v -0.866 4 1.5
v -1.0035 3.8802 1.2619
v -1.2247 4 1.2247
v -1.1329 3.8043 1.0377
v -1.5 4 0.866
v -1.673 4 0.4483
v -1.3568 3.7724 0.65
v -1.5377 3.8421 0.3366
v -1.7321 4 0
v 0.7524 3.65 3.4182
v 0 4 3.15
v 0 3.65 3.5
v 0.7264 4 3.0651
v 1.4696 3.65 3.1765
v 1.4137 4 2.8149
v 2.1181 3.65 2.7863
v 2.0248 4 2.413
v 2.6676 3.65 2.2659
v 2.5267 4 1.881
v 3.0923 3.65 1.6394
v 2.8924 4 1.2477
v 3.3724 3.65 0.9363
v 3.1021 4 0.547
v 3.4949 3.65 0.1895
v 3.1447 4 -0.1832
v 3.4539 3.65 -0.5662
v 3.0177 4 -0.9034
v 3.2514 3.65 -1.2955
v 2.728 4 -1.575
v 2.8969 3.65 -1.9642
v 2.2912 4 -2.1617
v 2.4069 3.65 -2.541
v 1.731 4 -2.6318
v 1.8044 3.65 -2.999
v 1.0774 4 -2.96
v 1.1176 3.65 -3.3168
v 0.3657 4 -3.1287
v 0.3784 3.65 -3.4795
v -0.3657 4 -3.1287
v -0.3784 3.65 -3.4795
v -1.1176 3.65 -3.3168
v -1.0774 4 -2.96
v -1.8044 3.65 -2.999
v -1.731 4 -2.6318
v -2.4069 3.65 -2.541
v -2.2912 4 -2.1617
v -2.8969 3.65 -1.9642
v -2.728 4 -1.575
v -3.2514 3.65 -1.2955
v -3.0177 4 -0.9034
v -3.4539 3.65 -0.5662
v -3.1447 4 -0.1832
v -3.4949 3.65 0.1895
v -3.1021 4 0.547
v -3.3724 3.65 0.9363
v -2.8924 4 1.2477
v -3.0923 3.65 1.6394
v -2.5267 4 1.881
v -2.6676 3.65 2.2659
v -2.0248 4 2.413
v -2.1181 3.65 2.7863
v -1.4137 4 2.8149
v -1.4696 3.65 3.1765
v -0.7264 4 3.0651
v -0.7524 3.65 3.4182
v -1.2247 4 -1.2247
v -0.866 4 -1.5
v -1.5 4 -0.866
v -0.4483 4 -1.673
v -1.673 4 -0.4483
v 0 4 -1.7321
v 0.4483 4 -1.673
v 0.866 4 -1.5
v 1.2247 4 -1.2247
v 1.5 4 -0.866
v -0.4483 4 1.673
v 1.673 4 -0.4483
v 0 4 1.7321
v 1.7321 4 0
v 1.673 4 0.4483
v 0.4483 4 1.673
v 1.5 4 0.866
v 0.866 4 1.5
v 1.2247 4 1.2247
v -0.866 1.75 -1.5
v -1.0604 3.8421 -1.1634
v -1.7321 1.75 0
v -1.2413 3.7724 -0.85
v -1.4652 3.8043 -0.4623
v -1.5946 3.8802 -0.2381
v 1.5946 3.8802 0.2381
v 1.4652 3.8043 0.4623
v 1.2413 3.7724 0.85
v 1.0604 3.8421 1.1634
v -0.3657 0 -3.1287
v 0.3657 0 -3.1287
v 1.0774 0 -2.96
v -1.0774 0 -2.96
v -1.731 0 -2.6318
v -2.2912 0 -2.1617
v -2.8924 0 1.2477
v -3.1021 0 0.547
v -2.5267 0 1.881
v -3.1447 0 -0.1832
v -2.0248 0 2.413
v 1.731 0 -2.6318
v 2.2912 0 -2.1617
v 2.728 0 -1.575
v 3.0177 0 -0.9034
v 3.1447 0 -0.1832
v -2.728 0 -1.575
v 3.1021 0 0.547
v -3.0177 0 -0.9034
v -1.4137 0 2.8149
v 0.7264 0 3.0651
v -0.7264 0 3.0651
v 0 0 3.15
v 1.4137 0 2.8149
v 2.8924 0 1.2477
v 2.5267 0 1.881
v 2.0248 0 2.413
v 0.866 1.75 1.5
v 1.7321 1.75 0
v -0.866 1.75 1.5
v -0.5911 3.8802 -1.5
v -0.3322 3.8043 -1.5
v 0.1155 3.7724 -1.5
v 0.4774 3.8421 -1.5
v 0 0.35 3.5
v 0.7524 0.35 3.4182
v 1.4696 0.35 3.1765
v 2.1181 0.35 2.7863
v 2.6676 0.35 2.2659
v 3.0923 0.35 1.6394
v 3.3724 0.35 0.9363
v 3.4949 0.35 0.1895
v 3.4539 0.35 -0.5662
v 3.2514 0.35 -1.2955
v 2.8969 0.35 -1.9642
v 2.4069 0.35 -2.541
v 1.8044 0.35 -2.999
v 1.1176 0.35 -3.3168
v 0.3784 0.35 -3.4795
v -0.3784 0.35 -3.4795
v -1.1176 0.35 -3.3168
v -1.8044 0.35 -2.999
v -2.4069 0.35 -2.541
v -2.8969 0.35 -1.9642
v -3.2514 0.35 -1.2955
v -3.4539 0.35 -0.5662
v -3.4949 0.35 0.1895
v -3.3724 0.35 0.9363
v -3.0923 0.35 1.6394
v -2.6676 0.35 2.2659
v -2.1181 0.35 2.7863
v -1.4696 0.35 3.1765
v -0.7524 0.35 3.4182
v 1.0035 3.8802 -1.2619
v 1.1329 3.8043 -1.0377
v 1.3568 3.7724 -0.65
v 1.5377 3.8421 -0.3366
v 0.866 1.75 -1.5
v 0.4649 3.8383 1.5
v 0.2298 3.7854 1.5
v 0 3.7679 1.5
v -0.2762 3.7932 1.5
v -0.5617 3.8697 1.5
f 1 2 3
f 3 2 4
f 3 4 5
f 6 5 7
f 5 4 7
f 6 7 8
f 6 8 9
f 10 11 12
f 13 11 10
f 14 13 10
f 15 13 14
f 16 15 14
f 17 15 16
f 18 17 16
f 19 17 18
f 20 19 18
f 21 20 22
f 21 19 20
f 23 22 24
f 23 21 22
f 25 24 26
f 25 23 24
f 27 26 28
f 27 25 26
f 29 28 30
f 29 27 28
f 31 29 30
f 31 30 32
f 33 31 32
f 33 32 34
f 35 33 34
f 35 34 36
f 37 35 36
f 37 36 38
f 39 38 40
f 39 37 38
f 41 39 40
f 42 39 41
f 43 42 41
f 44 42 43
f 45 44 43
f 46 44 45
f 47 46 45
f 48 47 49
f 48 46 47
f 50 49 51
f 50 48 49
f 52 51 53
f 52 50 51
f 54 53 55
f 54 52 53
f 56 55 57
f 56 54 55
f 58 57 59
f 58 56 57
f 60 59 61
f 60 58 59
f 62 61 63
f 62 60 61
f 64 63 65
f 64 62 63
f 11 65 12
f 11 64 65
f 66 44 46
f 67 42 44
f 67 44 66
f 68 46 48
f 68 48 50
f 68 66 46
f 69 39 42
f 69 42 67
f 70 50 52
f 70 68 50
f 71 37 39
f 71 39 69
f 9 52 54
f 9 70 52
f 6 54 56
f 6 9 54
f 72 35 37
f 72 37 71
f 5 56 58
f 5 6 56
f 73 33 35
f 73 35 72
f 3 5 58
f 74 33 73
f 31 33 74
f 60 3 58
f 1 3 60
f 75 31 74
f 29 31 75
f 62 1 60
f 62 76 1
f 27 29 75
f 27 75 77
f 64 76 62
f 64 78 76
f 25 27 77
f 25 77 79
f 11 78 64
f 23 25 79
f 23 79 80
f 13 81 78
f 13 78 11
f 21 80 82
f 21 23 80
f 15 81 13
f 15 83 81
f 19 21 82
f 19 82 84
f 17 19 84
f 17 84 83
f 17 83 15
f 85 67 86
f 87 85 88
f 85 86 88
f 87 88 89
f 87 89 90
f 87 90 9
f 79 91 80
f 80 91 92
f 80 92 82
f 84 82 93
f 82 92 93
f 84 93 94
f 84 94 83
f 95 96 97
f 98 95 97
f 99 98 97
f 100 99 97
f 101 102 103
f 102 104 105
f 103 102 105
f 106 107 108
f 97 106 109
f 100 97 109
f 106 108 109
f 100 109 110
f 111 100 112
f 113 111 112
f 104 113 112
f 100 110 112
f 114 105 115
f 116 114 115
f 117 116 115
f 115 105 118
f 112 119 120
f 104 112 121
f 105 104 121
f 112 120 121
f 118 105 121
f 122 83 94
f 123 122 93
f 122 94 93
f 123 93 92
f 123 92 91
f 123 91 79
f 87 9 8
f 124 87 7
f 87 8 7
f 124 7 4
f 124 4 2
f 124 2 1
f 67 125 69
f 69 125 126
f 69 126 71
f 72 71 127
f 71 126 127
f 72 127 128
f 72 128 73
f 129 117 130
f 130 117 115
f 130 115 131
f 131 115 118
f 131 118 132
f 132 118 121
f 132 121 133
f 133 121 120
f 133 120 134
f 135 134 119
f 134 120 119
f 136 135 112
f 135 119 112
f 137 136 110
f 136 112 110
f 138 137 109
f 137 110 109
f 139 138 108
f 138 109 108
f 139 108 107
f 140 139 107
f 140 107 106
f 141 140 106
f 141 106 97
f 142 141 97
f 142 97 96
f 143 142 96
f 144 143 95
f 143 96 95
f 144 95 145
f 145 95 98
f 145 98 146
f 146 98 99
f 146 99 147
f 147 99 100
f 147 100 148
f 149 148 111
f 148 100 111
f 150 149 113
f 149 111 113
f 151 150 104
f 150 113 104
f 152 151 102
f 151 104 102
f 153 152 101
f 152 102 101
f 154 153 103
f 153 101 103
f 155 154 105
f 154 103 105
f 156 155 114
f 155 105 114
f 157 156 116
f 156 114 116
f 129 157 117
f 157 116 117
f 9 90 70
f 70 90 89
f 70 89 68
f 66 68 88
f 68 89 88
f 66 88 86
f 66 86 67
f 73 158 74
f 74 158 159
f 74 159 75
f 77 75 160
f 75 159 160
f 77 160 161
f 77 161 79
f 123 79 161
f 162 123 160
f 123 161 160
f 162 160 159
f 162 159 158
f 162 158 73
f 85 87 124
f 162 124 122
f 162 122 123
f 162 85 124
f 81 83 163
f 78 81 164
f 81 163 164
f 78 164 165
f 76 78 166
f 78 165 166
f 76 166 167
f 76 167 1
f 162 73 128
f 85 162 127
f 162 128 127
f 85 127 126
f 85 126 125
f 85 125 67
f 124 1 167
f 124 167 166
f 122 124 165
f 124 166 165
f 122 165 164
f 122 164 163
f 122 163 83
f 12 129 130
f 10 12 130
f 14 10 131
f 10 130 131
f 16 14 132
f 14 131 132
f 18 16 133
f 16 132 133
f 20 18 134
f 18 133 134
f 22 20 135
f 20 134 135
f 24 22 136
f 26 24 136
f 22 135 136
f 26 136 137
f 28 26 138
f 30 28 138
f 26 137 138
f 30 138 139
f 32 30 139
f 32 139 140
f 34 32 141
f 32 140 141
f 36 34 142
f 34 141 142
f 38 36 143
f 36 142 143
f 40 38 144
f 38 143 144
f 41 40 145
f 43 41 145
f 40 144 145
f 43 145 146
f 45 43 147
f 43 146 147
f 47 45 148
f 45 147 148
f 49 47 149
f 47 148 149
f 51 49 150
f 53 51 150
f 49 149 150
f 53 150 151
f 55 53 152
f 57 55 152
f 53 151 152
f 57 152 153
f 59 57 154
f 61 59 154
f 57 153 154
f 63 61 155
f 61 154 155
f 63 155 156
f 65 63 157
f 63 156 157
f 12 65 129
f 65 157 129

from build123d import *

# Parameters (mm, degrees)
SKETCH1_R           = 3.5
BOSS_EXTRUDE1_DEPTH = 4
CUT_EXTRUDE1_DEPTH  = 2.25
CHAMFER1_SIZE       = 0.35


with BuildPart() as part:
    # Sketch1 → Boss-Extrude1 (new body)
    with BuildSketch(Plane(origin=(0, 0, 0), x_dir=(1, 0, 0), z_dir=(0, 1, 0))):
        with Locations(Location((0, 0, 0), (0, 0, 270))):
            Circle(SKETCH1_R)
    extrude(amount=BOSS_EXTRUDE1_DEPTH)

    # Sketch2 → Cut-Extrude1 (cut)
    with BuildSketch(Plane(origin=(0, 4, 0), x_dir=(1, 0, 0), z_dir=(0, 1, 0))):
        Polygon((0.866025404, 1.5), (-0.866025404, 1.5), (-1.732050808, 0), (-0.866025404, -1.5), (0.866025404, -1.5), (1.732050808, 0), align=None)
    extrude(amount=-CUT_EXTRUDE1_DEPTH, mode=Mode.SUBTRACT)

    # Cut-Extrude2 cone 1 section (through the dimple's axis) → Cut-Extrude2 (revolve, cut)
    with BuildSketch(Plane(origin=(0, 4, 0), x_dir=(0, 0, 1), z_dir=(1, 0, 0))):
        Polygon((0, 0), (1.732050808, 0), (0, 1.732050808), align=None)
    revolve(axis=Axis((0, 4, 0), (0, -1, 0)), mode=Mode.SUBTRACT)

    # Chamfer1
    chamfer1_edges = [part.edges().sort_by_distance(p)[0] for p in [
        (0, 0, -3.5),
        (0, 4, -3.5),
    ]]
    chamfer(chamfer1_edges, length=CHAMFER1_SIZE)


solid = part.part
